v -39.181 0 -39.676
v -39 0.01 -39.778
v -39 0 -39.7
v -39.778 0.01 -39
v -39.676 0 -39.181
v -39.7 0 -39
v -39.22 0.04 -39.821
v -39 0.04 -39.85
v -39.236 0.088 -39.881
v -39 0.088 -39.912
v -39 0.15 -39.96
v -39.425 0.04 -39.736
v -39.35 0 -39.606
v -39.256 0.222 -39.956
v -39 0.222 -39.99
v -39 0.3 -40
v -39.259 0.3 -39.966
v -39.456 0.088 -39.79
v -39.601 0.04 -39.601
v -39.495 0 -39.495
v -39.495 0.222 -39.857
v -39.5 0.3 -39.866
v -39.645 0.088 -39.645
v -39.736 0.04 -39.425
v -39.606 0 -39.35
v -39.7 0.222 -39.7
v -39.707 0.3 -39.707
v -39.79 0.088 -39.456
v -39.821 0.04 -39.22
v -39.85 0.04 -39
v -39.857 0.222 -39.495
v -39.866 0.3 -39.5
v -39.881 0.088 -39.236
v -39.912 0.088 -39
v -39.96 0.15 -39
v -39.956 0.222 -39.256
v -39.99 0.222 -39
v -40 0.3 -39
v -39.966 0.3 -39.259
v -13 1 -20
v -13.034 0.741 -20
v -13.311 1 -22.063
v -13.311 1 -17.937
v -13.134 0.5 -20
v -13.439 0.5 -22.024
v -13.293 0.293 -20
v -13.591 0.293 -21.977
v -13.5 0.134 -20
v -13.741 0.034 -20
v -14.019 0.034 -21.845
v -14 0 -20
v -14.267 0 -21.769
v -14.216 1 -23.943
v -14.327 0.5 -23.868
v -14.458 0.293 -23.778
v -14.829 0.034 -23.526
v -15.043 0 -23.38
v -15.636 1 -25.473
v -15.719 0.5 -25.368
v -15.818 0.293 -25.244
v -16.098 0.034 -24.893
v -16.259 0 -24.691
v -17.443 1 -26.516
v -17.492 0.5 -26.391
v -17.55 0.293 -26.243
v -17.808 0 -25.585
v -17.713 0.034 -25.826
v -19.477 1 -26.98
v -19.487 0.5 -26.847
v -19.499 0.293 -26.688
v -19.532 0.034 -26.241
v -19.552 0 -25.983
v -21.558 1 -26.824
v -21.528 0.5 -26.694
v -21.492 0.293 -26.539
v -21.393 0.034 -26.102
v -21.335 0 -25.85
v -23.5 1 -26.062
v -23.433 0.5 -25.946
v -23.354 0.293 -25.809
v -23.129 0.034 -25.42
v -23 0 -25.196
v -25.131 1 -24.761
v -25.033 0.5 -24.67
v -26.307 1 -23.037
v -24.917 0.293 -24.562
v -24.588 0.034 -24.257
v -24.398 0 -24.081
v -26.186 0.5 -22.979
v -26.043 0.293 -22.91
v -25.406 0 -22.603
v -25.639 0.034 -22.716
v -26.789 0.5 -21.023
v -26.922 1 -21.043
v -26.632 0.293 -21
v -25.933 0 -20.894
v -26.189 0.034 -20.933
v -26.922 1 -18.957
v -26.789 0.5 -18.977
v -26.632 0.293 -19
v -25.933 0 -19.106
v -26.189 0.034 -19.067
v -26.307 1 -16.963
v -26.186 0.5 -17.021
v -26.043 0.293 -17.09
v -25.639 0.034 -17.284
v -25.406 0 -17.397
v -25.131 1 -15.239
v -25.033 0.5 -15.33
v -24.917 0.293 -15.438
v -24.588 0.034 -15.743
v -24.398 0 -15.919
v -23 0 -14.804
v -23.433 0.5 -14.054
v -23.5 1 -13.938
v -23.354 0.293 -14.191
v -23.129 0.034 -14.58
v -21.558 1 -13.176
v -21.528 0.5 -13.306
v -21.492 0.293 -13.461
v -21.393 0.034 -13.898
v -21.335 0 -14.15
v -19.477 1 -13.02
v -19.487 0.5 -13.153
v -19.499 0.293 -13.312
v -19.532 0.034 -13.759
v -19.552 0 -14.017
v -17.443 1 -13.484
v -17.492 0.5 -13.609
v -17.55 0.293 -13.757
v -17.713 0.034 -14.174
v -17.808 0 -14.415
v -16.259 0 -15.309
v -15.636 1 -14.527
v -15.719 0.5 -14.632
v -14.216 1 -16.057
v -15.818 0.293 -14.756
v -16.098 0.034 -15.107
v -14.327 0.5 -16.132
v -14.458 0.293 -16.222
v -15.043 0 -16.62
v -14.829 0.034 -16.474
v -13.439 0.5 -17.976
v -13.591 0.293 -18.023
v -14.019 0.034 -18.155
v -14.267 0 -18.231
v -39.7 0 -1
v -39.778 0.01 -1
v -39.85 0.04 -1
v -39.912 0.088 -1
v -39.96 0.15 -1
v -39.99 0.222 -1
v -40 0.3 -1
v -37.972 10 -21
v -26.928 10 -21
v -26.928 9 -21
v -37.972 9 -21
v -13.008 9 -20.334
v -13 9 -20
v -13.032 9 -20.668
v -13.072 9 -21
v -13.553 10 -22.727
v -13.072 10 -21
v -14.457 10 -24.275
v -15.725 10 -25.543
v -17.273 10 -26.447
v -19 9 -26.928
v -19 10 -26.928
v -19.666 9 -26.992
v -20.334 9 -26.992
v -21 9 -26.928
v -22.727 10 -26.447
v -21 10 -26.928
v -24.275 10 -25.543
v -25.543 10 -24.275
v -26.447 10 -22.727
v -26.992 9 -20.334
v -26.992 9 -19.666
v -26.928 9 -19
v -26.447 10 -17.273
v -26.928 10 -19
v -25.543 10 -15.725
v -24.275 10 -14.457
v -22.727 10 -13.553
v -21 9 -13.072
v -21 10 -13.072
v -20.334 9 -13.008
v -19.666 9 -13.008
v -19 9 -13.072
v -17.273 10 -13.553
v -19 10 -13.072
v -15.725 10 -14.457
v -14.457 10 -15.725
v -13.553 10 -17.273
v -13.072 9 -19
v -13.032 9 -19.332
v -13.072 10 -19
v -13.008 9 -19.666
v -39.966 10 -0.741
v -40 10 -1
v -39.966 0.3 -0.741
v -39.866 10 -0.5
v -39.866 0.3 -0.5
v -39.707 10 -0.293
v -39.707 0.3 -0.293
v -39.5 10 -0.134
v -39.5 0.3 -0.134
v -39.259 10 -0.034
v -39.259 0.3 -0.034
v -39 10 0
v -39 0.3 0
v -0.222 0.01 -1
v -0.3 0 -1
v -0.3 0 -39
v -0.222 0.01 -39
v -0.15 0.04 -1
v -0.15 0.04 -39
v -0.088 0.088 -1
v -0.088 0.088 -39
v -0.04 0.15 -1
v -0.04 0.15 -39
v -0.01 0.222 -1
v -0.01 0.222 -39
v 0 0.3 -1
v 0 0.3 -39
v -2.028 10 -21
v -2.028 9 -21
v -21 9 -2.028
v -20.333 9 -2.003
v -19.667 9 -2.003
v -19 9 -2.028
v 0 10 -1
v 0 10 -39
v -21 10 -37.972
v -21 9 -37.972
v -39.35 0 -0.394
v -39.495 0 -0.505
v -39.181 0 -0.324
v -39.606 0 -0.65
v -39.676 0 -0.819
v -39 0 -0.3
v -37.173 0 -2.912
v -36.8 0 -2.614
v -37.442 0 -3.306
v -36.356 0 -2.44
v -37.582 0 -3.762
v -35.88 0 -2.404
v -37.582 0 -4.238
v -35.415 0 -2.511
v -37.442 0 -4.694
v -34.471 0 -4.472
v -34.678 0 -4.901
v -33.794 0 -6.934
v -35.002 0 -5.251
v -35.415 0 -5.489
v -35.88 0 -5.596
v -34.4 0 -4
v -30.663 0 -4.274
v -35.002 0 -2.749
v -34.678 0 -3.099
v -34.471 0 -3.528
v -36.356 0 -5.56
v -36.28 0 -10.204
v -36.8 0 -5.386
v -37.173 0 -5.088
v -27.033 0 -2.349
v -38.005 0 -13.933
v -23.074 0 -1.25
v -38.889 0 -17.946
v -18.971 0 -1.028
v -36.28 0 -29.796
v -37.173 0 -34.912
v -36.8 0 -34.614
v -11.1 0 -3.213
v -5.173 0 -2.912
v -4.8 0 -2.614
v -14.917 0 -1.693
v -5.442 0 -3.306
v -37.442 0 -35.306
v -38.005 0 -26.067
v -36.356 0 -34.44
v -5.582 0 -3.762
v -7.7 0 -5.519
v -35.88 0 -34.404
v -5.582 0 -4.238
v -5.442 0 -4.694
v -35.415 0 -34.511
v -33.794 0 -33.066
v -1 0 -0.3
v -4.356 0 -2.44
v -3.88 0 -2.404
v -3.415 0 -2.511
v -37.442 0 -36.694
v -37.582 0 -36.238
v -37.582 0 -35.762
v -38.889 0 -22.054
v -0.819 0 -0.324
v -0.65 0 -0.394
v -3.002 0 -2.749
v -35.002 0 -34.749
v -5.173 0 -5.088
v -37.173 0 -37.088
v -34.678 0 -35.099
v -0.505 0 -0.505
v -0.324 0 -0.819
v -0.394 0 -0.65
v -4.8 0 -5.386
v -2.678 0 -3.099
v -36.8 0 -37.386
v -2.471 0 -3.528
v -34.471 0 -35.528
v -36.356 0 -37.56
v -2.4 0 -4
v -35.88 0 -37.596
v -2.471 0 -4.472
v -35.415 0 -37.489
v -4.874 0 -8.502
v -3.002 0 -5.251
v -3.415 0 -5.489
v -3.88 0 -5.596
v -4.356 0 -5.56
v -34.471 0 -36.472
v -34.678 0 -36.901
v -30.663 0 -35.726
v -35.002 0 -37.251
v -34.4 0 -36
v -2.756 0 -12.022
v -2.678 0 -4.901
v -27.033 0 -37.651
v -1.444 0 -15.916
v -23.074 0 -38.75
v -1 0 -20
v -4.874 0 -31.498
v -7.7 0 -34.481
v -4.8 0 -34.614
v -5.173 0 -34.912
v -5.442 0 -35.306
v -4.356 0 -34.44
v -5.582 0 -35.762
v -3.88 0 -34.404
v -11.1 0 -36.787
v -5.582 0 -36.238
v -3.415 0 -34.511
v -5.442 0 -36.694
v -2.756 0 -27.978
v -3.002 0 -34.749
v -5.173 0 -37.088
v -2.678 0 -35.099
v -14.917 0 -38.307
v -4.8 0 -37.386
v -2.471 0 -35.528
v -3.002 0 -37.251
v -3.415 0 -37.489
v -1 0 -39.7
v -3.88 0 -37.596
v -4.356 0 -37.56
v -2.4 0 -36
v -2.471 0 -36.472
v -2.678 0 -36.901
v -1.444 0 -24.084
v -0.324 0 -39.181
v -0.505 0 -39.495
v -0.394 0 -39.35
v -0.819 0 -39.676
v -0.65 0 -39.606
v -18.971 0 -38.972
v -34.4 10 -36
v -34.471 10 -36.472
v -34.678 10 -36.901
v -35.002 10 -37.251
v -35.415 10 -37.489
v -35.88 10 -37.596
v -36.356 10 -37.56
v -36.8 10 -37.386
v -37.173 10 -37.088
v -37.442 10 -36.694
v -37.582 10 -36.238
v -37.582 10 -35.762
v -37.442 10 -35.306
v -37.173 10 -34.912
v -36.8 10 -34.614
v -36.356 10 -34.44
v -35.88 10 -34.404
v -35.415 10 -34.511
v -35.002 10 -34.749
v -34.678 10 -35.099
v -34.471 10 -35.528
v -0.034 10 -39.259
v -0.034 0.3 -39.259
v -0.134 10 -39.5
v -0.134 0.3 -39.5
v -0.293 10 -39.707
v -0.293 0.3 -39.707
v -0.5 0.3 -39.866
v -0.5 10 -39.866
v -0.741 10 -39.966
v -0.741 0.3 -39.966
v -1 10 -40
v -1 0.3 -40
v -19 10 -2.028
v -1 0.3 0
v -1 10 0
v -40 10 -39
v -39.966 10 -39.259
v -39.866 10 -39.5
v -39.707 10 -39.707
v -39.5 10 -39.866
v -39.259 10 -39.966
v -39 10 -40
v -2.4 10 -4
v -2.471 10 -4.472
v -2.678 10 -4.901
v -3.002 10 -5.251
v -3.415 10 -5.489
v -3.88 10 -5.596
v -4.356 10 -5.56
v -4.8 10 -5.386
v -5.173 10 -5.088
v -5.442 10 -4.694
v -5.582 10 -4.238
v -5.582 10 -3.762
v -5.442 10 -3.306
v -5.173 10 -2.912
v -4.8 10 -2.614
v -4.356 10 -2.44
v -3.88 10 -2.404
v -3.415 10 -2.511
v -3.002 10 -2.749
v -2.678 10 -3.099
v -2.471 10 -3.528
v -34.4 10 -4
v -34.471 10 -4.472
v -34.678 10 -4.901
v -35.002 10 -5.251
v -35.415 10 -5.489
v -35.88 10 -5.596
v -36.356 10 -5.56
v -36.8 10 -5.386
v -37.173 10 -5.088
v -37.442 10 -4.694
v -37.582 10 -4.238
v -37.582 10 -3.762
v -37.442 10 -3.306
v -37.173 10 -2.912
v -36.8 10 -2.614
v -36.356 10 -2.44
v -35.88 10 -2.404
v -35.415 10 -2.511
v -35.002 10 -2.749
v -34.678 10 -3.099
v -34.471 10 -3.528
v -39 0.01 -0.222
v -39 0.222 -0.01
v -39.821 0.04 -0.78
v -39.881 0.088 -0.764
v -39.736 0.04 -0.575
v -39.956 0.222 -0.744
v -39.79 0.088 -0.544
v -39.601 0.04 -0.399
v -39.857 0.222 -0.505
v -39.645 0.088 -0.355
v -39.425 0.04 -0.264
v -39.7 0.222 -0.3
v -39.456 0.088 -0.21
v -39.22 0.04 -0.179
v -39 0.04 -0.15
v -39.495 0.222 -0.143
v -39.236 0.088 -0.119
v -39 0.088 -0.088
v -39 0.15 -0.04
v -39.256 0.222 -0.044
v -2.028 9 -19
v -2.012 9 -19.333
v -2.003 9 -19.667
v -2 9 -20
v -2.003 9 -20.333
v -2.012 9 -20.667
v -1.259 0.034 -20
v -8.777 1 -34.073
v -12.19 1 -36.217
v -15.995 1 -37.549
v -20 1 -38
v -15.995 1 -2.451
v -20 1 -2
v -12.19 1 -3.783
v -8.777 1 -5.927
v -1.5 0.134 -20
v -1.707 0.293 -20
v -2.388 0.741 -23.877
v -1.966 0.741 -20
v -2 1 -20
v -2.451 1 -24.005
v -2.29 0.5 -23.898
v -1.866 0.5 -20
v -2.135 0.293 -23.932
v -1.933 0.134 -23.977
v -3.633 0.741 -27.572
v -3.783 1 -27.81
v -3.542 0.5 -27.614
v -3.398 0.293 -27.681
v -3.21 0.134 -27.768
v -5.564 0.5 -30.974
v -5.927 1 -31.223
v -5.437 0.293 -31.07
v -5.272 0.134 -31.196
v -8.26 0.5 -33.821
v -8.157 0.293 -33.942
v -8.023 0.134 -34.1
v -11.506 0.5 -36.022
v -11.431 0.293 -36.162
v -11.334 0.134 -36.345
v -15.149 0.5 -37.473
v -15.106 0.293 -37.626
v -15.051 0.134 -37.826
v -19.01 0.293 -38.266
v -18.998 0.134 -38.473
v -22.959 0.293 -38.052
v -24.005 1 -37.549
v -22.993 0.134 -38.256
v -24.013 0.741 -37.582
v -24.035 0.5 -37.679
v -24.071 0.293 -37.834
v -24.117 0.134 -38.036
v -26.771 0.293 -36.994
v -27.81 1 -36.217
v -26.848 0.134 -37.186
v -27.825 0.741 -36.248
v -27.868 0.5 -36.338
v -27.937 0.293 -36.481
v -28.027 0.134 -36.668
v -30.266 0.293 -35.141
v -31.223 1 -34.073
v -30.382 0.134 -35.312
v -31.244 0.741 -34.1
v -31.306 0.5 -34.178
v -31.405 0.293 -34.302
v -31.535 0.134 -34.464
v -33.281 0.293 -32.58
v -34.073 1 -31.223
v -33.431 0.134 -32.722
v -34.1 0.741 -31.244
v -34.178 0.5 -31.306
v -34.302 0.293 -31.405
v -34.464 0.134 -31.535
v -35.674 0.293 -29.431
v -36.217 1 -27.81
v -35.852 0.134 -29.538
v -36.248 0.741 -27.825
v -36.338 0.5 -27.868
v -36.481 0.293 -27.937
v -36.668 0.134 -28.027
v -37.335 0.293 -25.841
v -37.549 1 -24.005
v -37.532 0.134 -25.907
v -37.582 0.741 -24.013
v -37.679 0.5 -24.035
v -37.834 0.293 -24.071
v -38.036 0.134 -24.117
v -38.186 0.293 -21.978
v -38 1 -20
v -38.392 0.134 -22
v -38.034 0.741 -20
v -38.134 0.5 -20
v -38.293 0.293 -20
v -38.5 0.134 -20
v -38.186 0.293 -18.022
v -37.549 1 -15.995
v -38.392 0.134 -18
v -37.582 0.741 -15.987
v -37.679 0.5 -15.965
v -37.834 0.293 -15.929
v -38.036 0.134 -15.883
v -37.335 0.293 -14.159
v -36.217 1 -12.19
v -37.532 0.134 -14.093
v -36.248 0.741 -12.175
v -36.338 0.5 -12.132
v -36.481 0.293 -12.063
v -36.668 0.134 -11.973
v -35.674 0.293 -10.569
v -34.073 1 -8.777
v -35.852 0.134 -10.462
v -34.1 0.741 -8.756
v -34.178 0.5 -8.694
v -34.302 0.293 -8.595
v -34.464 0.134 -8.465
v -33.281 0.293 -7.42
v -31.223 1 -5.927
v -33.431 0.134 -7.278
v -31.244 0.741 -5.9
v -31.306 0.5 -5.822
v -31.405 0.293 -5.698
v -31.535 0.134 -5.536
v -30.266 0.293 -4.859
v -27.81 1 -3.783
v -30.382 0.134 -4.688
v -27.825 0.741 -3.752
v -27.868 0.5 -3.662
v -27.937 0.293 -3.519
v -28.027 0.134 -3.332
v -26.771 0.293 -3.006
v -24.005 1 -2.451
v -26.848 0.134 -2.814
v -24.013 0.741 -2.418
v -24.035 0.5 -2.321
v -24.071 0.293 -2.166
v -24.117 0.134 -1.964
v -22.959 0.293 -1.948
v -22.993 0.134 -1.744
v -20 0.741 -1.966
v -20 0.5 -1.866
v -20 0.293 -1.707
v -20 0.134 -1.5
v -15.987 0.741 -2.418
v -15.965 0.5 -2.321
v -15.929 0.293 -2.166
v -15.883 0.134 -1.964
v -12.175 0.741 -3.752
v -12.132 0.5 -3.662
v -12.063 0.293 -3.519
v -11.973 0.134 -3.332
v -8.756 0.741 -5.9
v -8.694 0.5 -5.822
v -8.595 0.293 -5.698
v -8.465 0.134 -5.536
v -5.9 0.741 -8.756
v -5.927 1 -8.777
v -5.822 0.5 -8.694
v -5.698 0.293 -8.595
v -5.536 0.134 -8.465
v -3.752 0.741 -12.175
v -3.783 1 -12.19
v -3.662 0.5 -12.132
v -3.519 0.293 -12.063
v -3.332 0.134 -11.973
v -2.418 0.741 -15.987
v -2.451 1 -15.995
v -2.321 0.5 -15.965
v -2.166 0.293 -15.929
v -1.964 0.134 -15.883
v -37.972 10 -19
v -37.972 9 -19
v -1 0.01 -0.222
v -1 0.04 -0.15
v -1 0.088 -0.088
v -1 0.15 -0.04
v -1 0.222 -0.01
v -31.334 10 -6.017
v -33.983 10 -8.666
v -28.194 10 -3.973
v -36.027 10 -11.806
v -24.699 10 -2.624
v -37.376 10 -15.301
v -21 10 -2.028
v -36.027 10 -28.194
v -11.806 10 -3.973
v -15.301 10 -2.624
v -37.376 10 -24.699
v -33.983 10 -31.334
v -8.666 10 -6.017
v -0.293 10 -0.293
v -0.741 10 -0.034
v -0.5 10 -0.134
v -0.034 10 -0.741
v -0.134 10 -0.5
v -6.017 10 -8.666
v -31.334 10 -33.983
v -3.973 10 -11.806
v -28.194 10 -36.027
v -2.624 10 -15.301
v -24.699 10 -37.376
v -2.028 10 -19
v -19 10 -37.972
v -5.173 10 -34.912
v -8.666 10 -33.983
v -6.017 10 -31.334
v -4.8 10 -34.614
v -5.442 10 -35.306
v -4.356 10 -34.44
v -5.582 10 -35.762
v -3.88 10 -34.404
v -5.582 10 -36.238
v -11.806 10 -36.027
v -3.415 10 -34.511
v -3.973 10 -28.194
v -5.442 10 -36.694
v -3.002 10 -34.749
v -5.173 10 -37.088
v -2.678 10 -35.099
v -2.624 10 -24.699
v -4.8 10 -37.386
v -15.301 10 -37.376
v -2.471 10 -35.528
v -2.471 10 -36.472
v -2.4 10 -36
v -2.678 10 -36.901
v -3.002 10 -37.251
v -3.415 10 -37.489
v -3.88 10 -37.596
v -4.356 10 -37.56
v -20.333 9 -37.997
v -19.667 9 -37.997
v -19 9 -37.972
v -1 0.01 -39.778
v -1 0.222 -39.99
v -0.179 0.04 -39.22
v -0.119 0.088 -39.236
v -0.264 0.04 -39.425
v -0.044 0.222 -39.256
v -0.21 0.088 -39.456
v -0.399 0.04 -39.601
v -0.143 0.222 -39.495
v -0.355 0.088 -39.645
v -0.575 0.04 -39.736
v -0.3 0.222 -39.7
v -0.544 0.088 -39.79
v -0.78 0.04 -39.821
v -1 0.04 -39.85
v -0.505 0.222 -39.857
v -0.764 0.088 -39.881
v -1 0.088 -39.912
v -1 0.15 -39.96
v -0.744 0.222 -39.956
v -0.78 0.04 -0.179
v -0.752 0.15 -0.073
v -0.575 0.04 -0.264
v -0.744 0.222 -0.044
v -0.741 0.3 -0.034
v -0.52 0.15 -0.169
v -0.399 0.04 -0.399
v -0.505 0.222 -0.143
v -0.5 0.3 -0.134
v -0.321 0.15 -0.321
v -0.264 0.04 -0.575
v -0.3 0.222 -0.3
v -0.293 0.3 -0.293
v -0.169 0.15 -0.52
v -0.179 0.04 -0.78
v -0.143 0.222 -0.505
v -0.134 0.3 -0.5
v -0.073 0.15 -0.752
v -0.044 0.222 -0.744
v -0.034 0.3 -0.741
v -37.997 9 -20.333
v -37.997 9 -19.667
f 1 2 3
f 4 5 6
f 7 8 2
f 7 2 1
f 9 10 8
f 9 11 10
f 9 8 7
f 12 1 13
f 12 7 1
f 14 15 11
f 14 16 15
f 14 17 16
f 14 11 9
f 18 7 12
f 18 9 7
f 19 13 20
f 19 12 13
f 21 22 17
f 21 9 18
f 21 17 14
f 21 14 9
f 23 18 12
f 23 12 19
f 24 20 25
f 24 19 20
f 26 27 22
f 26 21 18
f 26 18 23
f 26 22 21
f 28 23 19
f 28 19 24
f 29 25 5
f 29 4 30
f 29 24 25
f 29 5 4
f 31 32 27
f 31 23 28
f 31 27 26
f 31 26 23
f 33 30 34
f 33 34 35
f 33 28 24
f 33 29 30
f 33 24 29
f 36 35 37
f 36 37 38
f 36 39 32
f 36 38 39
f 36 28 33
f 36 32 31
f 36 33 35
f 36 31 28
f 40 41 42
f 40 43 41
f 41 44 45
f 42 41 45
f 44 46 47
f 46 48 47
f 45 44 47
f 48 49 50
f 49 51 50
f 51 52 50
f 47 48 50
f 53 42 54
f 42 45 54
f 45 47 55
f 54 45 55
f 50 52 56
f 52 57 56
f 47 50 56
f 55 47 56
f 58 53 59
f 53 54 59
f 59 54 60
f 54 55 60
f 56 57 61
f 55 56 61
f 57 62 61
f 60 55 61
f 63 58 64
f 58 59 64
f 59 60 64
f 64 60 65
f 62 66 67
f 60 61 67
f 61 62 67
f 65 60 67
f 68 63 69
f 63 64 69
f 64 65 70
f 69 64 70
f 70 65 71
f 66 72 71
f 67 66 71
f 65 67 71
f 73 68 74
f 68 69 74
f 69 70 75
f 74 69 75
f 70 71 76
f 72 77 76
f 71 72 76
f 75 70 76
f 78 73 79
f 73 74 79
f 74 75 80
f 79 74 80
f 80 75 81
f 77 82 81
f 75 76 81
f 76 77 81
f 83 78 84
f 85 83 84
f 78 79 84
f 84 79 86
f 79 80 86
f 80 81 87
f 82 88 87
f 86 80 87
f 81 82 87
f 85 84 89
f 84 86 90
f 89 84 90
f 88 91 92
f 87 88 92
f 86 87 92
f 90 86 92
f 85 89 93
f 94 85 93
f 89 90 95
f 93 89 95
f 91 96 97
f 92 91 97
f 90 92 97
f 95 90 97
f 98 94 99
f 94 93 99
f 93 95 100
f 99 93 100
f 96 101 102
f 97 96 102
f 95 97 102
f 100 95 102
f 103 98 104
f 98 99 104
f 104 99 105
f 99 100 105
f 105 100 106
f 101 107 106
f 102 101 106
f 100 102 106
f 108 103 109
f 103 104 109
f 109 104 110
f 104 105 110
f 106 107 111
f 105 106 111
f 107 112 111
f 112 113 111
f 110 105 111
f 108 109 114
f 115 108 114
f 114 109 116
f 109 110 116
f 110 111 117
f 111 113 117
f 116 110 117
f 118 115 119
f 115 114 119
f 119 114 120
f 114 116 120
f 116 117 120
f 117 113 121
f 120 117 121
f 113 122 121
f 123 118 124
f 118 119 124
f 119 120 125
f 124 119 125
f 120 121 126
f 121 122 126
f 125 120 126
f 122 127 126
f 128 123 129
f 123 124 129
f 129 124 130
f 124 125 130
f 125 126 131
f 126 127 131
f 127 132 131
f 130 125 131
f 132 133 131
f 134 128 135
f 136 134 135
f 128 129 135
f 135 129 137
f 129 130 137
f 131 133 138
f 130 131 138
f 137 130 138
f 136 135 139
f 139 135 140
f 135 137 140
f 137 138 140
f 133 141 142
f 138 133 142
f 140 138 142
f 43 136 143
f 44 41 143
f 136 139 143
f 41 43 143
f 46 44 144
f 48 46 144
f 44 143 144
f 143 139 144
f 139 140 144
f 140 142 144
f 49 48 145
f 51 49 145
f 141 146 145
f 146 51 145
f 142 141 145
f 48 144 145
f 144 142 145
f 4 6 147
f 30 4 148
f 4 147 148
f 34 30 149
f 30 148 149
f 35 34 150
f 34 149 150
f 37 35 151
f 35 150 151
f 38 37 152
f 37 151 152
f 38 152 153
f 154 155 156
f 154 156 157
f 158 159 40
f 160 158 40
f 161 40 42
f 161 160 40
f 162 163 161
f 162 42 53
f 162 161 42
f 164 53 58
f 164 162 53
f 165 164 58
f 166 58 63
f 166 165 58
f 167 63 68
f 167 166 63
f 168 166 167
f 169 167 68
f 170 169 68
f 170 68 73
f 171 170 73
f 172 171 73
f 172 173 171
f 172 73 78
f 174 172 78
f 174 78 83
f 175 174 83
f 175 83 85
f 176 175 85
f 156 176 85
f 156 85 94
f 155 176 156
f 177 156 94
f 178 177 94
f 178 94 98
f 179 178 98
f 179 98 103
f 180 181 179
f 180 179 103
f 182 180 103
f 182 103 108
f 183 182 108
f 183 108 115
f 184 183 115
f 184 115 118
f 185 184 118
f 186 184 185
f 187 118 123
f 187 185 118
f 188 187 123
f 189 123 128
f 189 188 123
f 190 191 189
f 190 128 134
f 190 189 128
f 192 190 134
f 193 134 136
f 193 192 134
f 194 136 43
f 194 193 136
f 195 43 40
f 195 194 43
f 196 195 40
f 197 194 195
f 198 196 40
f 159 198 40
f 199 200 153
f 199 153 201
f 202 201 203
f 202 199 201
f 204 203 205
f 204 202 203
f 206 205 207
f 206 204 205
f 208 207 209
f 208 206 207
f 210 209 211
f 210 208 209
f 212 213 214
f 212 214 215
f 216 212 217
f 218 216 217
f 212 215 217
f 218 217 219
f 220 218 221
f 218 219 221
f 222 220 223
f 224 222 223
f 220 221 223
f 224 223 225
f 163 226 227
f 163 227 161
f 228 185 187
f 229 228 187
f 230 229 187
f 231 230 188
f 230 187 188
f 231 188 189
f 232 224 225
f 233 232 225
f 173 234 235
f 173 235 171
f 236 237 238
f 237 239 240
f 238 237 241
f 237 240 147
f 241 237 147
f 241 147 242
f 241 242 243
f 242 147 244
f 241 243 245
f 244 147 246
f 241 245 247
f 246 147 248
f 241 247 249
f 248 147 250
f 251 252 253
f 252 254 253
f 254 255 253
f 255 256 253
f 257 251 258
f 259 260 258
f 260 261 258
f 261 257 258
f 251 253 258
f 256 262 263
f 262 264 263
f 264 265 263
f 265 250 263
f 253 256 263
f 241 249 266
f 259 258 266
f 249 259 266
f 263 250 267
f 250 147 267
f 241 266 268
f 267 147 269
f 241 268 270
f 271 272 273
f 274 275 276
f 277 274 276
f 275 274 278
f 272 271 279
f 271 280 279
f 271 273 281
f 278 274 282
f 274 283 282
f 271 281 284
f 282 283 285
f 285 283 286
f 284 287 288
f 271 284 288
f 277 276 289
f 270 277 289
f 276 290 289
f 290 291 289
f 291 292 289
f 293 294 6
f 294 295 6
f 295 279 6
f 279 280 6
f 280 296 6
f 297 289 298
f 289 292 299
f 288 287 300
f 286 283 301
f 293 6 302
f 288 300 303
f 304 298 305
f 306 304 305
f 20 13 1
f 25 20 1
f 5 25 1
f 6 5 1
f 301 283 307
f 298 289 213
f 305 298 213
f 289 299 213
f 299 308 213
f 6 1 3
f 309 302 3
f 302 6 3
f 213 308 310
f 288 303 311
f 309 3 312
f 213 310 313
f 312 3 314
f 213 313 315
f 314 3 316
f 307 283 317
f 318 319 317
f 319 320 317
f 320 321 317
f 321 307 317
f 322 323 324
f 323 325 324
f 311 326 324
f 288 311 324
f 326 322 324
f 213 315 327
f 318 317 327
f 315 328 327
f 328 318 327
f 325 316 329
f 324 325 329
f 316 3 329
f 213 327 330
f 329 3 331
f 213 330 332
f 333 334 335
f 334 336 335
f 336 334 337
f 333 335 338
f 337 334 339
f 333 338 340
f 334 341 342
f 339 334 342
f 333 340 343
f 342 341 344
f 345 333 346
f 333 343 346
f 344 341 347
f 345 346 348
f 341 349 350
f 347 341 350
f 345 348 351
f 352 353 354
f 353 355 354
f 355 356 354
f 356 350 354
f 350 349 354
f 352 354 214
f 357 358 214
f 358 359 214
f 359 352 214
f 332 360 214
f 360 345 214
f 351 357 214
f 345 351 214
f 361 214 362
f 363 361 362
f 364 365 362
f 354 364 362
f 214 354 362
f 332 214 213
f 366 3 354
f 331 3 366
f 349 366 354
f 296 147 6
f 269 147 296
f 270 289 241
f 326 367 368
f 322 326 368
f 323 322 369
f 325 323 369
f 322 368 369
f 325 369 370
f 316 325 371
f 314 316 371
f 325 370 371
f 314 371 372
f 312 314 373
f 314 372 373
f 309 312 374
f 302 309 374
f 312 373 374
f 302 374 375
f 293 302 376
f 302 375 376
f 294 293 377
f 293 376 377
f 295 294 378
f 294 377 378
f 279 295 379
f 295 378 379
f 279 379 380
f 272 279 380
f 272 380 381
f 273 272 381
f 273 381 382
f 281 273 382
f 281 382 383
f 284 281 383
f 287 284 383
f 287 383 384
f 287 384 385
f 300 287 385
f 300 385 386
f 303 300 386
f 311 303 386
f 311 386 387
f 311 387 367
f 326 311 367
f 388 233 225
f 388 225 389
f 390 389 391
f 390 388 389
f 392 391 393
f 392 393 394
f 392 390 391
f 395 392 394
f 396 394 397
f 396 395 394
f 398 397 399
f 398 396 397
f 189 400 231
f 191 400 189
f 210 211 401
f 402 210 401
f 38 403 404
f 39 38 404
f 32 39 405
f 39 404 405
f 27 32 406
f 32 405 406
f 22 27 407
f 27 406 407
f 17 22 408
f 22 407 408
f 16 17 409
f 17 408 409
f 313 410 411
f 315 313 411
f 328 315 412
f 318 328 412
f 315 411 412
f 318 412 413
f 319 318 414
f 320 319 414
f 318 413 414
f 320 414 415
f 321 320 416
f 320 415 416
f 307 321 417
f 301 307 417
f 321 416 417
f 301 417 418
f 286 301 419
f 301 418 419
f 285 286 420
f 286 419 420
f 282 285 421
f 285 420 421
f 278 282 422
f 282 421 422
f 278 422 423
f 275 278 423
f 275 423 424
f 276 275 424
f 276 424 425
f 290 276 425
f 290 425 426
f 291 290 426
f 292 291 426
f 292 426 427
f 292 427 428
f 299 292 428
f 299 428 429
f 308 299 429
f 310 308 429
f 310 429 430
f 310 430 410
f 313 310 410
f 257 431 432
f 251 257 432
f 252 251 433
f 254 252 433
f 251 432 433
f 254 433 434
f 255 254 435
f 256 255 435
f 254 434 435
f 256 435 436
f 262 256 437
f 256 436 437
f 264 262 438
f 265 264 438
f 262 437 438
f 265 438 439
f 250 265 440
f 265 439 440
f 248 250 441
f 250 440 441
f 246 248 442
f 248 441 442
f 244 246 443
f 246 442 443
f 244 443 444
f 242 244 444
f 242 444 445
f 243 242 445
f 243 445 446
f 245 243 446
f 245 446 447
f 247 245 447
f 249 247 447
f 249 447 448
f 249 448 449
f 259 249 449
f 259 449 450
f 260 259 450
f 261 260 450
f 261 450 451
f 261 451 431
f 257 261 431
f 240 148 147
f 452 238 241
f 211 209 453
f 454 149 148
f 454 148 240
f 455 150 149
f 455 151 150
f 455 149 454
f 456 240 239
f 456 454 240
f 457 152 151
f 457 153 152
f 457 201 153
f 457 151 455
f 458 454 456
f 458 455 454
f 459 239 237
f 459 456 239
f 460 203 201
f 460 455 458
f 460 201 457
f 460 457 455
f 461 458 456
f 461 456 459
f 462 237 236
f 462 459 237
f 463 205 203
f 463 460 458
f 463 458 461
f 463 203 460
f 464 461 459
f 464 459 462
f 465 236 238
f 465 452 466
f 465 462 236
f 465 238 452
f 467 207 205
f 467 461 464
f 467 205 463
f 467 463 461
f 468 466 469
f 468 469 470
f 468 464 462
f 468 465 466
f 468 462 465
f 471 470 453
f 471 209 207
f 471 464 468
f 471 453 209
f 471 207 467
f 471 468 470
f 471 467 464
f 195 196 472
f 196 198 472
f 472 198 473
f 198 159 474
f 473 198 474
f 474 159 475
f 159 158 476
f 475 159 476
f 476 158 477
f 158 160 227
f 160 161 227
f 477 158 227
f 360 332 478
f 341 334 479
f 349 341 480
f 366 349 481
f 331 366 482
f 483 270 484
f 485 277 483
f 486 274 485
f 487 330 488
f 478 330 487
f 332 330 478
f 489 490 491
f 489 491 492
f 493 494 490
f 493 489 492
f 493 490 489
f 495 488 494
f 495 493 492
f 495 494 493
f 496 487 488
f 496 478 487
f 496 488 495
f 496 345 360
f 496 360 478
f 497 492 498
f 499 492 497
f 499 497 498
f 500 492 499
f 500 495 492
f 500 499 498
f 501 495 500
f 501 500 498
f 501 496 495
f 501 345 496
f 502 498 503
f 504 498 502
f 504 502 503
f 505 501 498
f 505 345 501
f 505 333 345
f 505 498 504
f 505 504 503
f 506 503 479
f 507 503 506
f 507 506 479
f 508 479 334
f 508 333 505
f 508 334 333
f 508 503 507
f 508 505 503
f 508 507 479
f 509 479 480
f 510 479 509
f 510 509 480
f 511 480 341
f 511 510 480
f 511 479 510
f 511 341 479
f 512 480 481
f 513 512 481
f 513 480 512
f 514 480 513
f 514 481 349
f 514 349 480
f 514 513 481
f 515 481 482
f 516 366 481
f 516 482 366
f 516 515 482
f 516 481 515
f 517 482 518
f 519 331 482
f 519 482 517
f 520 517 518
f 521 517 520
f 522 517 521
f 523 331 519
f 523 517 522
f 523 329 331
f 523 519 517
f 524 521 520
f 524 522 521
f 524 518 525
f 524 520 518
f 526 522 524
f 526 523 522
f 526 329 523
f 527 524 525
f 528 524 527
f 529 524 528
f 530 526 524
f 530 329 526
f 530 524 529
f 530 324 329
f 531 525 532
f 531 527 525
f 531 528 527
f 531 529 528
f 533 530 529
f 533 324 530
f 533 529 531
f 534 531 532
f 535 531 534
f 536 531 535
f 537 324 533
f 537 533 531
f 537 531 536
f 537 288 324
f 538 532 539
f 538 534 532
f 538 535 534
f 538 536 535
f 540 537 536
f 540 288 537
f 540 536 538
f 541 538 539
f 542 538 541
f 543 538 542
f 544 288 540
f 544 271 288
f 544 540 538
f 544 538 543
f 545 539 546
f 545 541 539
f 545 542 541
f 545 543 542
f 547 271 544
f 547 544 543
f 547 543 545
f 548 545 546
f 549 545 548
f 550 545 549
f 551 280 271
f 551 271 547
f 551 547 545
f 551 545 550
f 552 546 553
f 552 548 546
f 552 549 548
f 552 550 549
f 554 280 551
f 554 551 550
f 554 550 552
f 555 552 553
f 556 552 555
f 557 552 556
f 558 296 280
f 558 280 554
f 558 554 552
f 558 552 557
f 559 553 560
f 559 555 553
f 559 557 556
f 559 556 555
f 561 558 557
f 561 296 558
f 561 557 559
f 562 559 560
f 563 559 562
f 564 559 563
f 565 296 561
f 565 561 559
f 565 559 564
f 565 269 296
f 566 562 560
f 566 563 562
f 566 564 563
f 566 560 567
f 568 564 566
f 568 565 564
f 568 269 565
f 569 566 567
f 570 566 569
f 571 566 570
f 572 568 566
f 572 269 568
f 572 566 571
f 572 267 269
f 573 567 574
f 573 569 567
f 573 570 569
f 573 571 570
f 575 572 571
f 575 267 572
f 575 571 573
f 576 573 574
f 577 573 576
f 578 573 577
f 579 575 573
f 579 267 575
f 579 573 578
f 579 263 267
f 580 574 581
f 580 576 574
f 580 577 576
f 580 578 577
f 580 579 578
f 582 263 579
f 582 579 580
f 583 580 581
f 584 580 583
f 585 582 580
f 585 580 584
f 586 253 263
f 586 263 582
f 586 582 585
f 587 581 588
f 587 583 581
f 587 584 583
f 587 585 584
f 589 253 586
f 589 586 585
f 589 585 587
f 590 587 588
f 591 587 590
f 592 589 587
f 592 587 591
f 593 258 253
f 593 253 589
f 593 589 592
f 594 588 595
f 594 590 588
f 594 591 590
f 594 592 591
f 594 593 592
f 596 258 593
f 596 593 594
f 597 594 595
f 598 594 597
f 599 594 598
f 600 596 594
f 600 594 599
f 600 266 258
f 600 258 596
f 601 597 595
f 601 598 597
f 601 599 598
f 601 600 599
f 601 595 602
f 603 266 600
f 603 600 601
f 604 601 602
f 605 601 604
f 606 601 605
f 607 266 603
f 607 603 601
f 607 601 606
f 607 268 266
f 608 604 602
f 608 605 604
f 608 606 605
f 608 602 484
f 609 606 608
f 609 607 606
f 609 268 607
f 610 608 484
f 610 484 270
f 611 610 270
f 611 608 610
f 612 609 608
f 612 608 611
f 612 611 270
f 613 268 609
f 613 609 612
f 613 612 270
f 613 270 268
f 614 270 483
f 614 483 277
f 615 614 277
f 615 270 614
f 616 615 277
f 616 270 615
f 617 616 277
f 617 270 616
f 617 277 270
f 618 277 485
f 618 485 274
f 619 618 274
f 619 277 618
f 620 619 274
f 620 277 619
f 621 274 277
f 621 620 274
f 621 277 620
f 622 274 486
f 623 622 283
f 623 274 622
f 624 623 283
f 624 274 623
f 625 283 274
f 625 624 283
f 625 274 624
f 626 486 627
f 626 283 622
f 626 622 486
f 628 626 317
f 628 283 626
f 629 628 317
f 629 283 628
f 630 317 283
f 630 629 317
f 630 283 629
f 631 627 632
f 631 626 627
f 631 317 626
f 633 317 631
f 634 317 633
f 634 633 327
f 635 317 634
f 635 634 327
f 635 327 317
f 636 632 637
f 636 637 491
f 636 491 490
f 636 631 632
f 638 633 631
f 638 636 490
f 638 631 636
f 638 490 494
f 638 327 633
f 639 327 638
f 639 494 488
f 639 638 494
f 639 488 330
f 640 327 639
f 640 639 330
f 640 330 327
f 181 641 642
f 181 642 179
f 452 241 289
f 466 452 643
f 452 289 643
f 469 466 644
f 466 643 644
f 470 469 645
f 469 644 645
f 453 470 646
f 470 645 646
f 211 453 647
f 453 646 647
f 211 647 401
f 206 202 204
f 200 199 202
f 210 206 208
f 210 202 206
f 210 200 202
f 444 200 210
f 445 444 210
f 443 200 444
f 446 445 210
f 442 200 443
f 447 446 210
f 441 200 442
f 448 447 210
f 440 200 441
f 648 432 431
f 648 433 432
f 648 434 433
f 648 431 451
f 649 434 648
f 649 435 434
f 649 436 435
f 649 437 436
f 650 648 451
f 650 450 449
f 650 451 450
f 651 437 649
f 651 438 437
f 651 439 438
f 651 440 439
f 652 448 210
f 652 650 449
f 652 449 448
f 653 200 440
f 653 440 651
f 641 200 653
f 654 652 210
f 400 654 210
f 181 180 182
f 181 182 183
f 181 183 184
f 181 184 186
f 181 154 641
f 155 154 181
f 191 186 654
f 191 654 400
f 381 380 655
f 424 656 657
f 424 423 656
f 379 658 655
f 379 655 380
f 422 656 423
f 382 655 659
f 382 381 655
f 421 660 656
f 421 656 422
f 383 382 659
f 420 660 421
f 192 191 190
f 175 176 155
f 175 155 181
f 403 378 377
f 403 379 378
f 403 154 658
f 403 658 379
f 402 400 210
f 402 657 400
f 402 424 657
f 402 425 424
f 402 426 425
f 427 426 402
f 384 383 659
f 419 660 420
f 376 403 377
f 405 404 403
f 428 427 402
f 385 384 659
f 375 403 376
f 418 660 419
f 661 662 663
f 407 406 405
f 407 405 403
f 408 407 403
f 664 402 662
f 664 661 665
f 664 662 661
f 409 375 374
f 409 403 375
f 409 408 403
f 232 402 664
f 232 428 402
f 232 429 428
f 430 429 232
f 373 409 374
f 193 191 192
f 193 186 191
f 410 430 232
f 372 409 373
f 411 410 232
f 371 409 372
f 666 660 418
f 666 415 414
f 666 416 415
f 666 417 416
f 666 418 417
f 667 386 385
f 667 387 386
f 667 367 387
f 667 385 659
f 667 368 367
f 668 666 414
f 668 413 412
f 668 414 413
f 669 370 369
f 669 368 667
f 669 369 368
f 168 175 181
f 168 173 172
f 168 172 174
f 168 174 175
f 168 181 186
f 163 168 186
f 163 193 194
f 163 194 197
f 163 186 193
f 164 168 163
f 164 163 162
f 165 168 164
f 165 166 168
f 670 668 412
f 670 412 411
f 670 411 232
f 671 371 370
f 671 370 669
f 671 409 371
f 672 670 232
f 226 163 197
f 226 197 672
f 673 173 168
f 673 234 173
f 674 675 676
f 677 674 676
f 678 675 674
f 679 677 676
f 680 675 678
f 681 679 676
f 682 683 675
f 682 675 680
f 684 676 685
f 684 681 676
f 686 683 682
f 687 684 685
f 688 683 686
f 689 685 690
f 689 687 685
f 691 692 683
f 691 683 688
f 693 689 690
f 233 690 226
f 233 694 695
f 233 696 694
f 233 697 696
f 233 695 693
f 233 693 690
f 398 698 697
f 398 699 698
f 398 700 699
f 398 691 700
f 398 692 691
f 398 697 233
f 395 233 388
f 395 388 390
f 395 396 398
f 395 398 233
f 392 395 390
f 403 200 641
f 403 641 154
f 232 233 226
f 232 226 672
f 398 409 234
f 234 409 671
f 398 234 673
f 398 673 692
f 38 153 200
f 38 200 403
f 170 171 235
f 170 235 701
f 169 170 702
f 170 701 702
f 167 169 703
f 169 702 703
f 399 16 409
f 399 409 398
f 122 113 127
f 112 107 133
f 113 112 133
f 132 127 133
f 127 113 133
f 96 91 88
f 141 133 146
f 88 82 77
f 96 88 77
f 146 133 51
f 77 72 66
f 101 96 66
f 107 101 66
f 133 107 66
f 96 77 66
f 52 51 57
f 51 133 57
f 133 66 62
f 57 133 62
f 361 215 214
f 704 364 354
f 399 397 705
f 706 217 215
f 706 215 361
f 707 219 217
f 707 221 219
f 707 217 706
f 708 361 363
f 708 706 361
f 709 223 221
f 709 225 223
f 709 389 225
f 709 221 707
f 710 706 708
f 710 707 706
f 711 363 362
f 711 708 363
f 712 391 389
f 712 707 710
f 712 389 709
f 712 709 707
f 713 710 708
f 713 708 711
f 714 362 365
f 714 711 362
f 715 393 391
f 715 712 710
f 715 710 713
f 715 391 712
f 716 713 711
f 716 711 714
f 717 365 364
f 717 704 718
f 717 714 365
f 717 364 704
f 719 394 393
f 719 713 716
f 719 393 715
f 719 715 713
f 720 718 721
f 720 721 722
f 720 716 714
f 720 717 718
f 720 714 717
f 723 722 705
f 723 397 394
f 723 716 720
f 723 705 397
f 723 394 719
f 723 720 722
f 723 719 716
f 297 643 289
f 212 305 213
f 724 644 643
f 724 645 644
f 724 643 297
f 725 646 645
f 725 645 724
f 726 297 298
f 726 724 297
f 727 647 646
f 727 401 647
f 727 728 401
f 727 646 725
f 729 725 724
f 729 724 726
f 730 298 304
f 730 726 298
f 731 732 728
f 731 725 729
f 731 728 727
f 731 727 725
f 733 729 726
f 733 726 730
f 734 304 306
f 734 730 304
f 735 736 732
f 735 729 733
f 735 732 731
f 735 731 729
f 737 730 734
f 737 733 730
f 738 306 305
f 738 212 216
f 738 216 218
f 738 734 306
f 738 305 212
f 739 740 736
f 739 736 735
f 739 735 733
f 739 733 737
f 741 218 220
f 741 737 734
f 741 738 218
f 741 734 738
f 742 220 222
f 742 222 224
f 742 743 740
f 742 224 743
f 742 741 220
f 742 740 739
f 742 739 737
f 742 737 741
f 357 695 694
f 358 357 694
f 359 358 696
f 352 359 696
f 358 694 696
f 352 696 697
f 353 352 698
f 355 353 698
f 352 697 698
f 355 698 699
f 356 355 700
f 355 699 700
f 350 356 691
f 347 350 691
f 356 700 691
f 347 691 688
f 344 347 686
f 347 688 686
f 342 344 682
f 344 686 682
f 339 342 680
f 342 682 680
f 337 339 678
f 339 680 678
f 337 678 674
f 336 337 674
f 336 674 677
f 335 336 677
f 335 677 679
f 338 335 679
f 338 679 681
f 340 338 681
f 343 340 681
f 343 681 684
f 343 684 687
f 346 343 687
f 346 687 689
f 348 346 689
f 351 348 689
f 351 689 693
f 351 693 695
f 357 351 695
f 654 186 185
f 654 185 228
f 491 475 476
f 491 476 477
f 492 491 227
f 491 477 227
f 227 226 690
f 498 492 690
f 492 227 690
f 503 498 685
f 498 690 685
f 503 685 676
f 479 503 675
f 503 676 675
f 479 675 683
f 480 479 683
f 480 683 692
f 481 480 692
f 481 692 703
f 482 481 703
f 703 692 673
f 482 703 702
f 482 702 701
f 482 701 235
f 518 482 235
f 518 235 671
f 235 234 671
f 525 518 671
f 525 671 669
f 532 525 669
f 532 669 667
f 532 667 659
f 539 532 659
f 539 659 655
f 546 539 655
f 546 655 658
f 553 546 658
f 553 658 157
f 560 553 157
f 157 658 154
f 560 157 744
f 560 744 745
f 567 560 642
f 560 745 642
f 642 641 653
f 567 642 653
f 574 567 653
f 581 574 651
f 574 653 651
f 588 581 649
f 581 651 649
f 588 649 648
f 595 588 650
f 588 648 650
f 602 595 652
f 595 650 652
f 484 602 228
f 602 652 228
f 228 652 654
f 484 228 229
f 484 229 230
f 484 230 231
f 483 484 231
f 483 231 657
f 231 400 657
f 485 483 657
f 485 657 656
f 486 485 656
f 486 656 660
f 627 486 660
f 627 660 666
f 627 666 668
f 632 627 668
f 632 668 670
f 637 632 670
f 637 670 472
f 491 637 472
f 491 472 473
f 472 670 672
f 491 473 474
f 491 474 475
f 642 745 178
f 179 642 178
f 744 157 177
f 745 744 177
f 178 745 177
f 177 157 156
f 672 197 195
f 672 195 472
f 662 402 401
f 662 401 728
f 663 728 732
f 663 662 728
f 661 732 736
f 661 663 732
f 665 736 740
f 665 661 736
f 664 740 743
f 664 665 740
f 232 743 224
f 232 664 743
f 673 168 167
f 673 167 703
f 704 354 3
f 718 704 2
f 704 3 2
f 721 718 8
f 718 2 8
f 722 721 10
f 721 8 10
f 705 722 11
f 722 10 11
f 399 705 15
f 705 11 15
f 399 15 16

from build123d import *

# Parameters (mm, degrees)
SKETCH1_W           = 40
SKETCH1_H           = 40
BOSS_EXTRUDE1_DEPTH = 10
FILLET1_R           = 1
SKETCH2_R           = 18
SKETCH2_R_2         = 7
CUT_EXTRUDE2_DEPTH  = 10
SKETCH3_R           = 1.6
CUT_EXTRUDE3_DEPTH  = 11
BOSS_EXTRUDE2_DEPTH = 1
FILLET2_R           = 1
FILLET3_R           = 1
FILLET4_R           = 0.3


with BuildPart() as part:
    # Sketch1 → Boss-Extrude1 (new body)
    with BuildSketch(Plane(origin=(0, 0, 0), x_dir=(1, 0, 0), z_dir=(0, 1, 0))):
        with Locations((-20, 20)):
            Rectangle(SKETCH1_W, SKETCH1_H)
    extrude(amount=BOSS_EXTRUDE1_DEPTH)

    # Fillet1
    fillet1_edges = [part.edges().sort_by_distance(p)[0] for p in [
        (0, 5, 0),
        (-40, 5, 0),
        (-40, 5, -40),
        (0, 5, -40),
    ]]
    fillet(fillet1_edges, radius=FILLET1_R)

    # Sketch2 → Cut-Extrude2 (cut)
    with BuildSketch(Plane(origin=(0, 10, 0), x_dir=(1, 0, 0), z_dir=(0, 1, 0))):
        with Locations((-20, 20)):
            Circle(SKETCH2_R)
        with Locations((-20, 20)):
            Circle(SKETCH2_R_2, mode=Mode.SUBTRACT)
    extrude(amount=-CUT_EXTRUDE2_DEPTH, mode=Mode.SUBTRACT)

    # Sketch3 → Cut-Extrude3 (cut, through all)
    with BuildSketch(Plane(origin=(0, 10, 0), x_dir=(1, 0, 0), z_dir=(0, 1, 0))):
        with Locations((-36, 36)):
            Circle(SKETCH3_R)
        with Locations((-4, 36)):
            Circle(SKETCH3_R)
        with Locations((-4, 4)):
            Circle(SKETCH3_R)
        with Locations((-36, 4)):
            Circle(SKETCH3_R)
    extrude(amount=-CUT_EXTRUDE3_DEPTH, mode=Mode.SUBTRACT)

    # Sketch7 → Boss-Extrude2 (add)
    with BuildSketch(Plane(origin=(0, 10, 0), x_dir=(1, 0, 0), z_dir=(0, 1, 0))):
        with BuildLine():
            Line((-21, 21), (-37.972200756, 21))
            ThreePointArc((-37.972200756, 21), (-38, 20), (-37.972200756, 19))
            Line((-37.972200756, 19), (-21, 19))
            Line((-21, 19), (-21, 21))
        make_face()
        with BuildLine():
            Line((-21, 37.972200756), (-21, 21))
            Line((-21, 21), (-19, 21))
            Line((-19, 21), (-19, 37.972200756))
            ThreePointArc((-19, 37.972200756), (-20, 38), (-21, 37.972200756))
        make_face()
        with BuildLine():
            Line((-2.027799244, 21), (-19, 21))
            Line((-19, 21), (-19, 19))
            Line((-19, 19), (-2.027799244, 19))
            ThreePointArc((-2.027799244, 19), (-2.006951153, 19.499806838), (-2, 20))
            ThreePointArc((-2, 20), (-2.006951153, 20.500193162), (-2.027799244, 21))
        make_face()
        with BuildLine():
            Line((-19, 19), (-21, 19))
            Line((-21, 19), (-21, 2.027799244))
            ThreePointArc((-21, 2.027799244), (-20, 2), (-19, 2.027799244))
            Line((-19, 2.027799244), (-19, 19))
        make_face()
    extrude(amount=-BOSS_EXTRUDE2_DEPTH)

    # Fillet2
    fillet2_edges = [part.edges().sort_by_distance(p)[0] for p in [
        (-27, 0, -20),
    ]]
    fillet(fillet2_edges, radius=FILLET2_R)

    # Fillet3
    fillet3_edges = [part.edges().sort_by_distance(p)[0] for p in [
        (-38, 0, -20),
    ]]
    fillet(fillet3_edges, radius=FILLET3_R)

    # Fillet4
    fillet4_edges = [part.edges().sort_by_distance(p)[0] for p in [
        (0, 0, -20),
        (-20, 0, -40),
        (-40, 0, -20),
        (-20, 0, 0),
        (-0.292893219, 0, -39.707106781),
        (-0.292893219, 0, -0.292893219),
        (-39.707106781, 0, -0.292893219),
        (-39.707106781, 0, -39.707106781),
    ]]
    fillet(fillet4_edges, radius=FILLET4_R)


solid = part.part
